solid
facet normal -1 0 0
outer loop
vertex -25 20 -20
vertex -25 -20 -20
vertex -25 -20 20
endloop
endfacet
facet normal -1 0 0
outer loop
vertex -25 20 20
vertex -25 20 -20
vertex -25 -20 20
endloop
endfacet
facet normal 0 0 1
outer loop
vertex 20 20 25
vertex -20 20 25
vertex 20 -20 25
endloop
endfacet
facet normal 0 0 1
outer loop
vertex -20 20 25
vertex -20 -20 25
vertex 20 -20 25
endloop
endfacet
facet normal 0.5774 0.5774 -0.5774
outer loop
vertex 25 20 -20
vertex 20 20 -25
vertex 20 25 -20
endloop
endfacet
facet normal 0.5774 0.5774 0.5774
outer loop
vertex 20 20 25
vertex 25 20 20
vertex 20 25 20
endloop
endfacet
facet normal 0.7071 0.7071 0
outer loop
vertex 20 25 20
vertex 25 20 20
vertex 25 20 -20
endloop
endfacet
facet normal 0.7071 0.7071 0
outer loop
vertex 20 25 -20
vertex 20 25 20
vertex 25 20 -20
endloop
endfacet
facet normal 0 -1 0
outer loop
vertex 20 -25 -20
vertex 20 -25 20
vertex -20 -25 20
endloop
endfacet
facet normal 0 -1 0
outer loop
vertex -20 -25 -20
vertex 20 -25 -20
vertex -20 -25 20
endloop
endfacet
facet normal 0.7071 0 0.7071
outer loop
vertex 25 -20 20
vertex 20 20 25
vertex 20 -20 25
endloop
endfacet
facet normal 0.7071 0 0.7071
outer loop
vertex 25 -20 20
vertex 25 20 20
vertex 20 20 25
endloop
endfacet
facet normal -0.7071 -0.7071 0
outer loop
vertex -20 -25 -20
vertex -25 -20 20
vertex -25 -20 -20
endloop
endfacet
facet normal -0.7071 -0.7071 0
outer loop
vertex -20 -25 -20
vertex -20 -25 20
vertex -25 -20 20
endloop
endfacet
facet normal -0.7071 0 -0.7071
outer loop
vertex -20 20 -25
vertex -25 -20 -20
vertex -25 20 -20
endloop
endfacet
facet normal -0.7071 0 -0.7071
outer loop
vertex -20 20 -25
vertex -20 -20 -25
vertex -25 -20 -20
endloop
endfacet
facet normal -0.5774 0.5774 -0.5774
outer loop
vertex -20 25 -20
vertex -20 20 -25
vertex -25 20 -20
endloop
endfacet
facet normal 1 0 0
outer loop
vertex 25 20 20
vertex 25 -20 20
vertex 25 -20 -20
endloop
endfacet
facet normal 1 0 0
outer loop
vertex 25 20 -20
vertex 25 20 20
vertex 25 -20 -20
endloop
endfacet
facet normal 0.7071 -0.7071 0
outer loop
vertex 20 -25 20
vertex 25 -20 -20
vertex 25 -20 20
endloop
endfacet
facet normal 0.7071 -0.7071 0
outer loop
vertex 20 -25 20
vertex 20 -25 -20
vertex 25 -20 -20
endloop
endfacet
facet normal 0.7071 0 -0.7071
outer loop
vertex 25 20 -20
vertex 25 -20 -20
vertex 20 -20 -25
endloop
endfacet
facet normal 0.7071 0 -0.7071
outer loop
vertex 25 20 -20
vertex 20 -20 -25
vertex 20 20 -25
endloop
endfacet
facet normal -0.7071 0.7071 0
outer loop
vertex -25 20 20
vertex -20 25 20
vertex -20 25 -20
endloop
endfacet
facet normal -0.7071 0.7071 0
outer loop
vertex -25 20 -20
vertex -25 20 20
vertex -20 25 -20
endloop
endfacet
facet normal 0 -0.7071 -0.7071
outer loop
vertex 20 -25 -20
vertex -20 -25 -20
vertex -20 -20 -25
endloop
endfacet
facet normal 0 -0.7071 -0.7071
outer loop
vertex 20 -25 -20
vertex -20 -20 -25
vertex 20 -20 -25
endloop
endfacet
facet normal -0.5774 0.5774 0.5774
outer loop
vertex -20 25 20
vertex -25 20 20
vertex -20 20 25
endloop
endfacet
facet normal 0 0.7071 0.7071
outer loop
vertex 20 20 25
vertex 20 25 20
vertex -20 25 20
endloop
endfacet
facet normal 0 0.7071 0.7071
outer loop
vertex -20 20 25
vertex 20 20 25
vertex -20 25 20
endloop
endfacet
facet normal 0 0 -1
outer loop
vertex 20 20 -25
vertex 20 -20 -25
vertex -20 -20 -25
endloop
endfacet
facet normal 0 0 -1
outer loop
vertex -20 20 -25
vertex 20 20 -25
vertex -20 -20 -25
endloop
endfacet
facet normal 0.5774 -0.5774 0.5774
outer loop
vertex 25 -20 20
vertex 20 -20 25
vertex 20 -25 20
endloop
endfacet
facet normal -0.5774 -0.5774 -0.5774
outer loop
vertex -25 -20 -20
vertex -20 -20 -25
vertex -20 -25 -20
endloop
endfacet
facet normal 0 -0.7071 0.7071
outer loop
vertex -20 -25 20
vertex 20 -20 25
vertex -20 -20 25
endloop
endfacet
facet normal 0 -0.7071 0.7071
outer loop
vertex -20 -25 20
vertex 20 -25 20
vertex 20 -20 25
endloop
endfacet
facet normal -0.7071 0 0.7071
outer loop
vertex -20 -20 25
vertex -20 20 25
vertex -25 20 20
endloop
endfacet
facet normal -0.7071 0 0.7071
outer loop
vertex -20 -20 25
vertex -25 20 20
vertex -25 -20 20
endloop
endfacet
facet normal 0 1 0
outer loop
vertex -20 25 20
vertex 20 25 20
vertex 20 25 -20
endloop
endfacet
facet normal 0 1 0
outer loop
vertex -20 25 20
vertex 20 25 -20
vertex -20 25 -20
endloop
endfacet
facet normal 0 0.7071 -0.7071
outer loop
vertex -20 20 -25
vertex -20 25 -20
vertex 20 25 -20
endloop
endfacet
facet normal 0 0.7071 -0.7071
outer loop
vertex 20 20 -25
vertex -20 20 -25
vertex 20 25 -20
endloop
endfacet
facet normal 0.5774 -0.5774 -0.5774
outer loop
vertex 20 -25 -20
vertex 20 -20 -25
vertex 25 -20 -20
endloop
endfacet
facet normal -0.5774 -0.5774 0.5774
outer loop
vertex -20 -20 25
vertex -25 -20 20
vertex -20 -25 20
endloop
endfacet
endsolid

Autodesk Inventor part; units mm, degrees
ref_plane "YZ Plane" through (0, 0, 0) normal (1, 0, 0) x (0, 1, 0)
ref_plane "XZ Plane" through (0, 0, 0) normal (0, 1, 0) x (-1, 0, 0)
ref_plane "XY Plane" through (0, 0, 0) normal (0, 0, 1) x (1, 0, 0)
sketch "Sketch1" plane through (0, 0, 0) normal (0, 1, 0) x (-1, 0, 0)
  line L0 (25, 25) -> (-25, 25)
  line L1 (-25, 25) -> (-25, -25)
  line L2 (-25, -25) -> (25, -25)
  line L3 (25, -25) -> (25, 25)
  line L4 (25, 25) -> (-25, -25) construction
  line L5 (-25, 25) -> (25, -25) construction
  point P0 (0, 0)
  dimension "d0" = 50
  dimension "d1" = 50
extrude "Extrusion1" add sketch "Sketch1" along normal mid plane 50
chamfer "Chamfer1" distance 5 angle 45 12 edges at (25, 0, -25) (0, 25, -25) (-25, 0, -25) (-25, 25, 0) (-25, 0, 25) (25, 0, 25) (0, -25, -25) (-25, -25, 0) (0, -25, 25) (25, -25, 0) (25, 25, 0) (0, 25, 25)
properties part number "ElementaryCube" material "Silver"
